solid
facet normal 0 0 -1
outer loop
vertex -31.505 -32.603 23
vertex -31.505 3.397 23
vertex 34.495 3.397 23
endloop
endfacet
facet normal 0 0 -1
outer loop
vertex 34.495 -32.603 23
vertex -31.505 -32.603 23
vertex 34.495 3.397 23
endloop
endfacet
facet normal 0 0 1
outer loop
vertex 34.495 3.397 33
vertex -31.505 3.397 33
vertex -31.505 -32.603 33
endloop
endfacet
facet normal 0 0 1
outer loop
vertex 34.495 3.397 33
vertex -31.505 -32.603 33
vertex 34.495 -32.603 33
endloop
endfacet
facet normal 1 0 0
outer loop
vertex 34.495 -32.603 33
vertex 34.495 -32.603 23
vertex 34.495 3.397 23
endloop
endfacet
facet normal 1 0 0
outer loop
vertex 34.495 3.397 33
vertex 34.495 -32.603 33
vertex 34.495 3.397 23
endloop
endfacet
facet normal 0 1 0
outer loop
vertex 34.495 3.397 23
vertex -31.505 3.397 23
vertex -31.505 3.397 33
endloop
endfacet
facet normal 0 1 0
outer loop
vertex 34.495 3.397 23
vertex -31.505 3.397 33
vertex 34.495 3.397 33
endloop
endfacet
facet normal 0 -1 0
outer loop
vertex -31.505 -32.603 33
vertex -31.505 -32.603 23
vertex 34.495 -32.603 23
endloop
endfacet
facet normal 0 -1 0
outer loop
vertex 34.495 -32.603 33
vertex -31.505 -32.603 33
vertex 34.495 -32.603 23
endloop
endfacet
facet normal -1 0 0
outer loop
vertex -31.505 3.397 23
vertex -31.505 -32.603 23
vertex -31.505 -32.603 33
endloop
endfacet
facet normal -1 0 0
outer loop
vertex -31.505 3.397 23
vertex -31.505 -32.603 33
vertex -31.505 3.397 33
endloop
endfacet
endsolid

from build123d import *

# Parameters (mm, degrees)
CIRCLE001_R      = 0.5
EXTRUDE094_DEPTH = 10
CIRCLE002_R      = 0.5
EXTRUDE095_DEPTH = 10
CIRCLE003_R      = 0.5
EXTRUDE096_DEPTH = 10
RECTANGLE_W      = 66
RECTANGLE_H      = 36
EXTRUDE097_DEPTH = 10
CIRCLE_R         = 0.5
EXTRUDE093_DEPTH = 10


with BuildPart() as extrude094:
    # Circle001 → Extrude094 (new body)
    with BuildSketch(Plane(origin=(130.060043, -64.785744, 0), x_dir=(1, 0, 0), z_dir=(0, 0, 1))):
        Circle(CIRCLE001_R)
    extrude(amount=EXTRUDE094_DEPTH)


with BuildPart() as extrude095:
    # Circle002 → Extrude095 (new body)
    with BuildSketch(Plane(origin=(70.798393, -64.7696, 0), x_dir=(1, 0, 0), z_dir=(0, 0, 1))):
        Circle(CIRCLE002_R)
    extrude(amount=EXTRUDE095_DEPTH)


with BuildPart() as extrude096:
    # Circle003 → Extrude096 (new body)
    with BuildSketch(Plane(origin=(70.79007, -35.800797, 0), x_dir=(1, 0, 0), z_dir=(0, 0, 1))):
        Circle(CIRCLE003_R)
    extrude(amount=EXTRUDE096_DEPTH)


with BuildPart() as extrude097:
    # Rectangle → Extrude097 (new body)
    with BuildSketch(Plane(origin=(67.836318, -67.212706, 0), x_dir=(1, 0, 0), z_dir=(0, 0, 1))):
        with Locations((33, 18)):
            Rectangle(RECTANGLE_W, RECTANGLE_H)
    extrude(amount=EXTRUDE097_DEPTH)


with BuildPart() as pcb:
    # Circle → Extrude093 (new body)
    with BuildSketch(Plane(origin=(130.059311, -35.555641, 0), x_dir=(1, 0, 0), z_dir=(0, 0, 1))):
        Circle(CIRCLE_R)
    extrude(amount=EXTRUDE093_DEPTH)

    # Fusion003: union Extrude094, Extrude095, Extrude096, Extrude097
    add(extrude094.part)
    add(extrude095.part)
    add(extrude096.part)
    add(extrude097.part)


with BuildPart() as pcb_1:
    # Fusion003 placement: moved
    add(pcb.part.moved(Location((-99.341595, 34.609312, 23))))


solid = pcb_1.part
